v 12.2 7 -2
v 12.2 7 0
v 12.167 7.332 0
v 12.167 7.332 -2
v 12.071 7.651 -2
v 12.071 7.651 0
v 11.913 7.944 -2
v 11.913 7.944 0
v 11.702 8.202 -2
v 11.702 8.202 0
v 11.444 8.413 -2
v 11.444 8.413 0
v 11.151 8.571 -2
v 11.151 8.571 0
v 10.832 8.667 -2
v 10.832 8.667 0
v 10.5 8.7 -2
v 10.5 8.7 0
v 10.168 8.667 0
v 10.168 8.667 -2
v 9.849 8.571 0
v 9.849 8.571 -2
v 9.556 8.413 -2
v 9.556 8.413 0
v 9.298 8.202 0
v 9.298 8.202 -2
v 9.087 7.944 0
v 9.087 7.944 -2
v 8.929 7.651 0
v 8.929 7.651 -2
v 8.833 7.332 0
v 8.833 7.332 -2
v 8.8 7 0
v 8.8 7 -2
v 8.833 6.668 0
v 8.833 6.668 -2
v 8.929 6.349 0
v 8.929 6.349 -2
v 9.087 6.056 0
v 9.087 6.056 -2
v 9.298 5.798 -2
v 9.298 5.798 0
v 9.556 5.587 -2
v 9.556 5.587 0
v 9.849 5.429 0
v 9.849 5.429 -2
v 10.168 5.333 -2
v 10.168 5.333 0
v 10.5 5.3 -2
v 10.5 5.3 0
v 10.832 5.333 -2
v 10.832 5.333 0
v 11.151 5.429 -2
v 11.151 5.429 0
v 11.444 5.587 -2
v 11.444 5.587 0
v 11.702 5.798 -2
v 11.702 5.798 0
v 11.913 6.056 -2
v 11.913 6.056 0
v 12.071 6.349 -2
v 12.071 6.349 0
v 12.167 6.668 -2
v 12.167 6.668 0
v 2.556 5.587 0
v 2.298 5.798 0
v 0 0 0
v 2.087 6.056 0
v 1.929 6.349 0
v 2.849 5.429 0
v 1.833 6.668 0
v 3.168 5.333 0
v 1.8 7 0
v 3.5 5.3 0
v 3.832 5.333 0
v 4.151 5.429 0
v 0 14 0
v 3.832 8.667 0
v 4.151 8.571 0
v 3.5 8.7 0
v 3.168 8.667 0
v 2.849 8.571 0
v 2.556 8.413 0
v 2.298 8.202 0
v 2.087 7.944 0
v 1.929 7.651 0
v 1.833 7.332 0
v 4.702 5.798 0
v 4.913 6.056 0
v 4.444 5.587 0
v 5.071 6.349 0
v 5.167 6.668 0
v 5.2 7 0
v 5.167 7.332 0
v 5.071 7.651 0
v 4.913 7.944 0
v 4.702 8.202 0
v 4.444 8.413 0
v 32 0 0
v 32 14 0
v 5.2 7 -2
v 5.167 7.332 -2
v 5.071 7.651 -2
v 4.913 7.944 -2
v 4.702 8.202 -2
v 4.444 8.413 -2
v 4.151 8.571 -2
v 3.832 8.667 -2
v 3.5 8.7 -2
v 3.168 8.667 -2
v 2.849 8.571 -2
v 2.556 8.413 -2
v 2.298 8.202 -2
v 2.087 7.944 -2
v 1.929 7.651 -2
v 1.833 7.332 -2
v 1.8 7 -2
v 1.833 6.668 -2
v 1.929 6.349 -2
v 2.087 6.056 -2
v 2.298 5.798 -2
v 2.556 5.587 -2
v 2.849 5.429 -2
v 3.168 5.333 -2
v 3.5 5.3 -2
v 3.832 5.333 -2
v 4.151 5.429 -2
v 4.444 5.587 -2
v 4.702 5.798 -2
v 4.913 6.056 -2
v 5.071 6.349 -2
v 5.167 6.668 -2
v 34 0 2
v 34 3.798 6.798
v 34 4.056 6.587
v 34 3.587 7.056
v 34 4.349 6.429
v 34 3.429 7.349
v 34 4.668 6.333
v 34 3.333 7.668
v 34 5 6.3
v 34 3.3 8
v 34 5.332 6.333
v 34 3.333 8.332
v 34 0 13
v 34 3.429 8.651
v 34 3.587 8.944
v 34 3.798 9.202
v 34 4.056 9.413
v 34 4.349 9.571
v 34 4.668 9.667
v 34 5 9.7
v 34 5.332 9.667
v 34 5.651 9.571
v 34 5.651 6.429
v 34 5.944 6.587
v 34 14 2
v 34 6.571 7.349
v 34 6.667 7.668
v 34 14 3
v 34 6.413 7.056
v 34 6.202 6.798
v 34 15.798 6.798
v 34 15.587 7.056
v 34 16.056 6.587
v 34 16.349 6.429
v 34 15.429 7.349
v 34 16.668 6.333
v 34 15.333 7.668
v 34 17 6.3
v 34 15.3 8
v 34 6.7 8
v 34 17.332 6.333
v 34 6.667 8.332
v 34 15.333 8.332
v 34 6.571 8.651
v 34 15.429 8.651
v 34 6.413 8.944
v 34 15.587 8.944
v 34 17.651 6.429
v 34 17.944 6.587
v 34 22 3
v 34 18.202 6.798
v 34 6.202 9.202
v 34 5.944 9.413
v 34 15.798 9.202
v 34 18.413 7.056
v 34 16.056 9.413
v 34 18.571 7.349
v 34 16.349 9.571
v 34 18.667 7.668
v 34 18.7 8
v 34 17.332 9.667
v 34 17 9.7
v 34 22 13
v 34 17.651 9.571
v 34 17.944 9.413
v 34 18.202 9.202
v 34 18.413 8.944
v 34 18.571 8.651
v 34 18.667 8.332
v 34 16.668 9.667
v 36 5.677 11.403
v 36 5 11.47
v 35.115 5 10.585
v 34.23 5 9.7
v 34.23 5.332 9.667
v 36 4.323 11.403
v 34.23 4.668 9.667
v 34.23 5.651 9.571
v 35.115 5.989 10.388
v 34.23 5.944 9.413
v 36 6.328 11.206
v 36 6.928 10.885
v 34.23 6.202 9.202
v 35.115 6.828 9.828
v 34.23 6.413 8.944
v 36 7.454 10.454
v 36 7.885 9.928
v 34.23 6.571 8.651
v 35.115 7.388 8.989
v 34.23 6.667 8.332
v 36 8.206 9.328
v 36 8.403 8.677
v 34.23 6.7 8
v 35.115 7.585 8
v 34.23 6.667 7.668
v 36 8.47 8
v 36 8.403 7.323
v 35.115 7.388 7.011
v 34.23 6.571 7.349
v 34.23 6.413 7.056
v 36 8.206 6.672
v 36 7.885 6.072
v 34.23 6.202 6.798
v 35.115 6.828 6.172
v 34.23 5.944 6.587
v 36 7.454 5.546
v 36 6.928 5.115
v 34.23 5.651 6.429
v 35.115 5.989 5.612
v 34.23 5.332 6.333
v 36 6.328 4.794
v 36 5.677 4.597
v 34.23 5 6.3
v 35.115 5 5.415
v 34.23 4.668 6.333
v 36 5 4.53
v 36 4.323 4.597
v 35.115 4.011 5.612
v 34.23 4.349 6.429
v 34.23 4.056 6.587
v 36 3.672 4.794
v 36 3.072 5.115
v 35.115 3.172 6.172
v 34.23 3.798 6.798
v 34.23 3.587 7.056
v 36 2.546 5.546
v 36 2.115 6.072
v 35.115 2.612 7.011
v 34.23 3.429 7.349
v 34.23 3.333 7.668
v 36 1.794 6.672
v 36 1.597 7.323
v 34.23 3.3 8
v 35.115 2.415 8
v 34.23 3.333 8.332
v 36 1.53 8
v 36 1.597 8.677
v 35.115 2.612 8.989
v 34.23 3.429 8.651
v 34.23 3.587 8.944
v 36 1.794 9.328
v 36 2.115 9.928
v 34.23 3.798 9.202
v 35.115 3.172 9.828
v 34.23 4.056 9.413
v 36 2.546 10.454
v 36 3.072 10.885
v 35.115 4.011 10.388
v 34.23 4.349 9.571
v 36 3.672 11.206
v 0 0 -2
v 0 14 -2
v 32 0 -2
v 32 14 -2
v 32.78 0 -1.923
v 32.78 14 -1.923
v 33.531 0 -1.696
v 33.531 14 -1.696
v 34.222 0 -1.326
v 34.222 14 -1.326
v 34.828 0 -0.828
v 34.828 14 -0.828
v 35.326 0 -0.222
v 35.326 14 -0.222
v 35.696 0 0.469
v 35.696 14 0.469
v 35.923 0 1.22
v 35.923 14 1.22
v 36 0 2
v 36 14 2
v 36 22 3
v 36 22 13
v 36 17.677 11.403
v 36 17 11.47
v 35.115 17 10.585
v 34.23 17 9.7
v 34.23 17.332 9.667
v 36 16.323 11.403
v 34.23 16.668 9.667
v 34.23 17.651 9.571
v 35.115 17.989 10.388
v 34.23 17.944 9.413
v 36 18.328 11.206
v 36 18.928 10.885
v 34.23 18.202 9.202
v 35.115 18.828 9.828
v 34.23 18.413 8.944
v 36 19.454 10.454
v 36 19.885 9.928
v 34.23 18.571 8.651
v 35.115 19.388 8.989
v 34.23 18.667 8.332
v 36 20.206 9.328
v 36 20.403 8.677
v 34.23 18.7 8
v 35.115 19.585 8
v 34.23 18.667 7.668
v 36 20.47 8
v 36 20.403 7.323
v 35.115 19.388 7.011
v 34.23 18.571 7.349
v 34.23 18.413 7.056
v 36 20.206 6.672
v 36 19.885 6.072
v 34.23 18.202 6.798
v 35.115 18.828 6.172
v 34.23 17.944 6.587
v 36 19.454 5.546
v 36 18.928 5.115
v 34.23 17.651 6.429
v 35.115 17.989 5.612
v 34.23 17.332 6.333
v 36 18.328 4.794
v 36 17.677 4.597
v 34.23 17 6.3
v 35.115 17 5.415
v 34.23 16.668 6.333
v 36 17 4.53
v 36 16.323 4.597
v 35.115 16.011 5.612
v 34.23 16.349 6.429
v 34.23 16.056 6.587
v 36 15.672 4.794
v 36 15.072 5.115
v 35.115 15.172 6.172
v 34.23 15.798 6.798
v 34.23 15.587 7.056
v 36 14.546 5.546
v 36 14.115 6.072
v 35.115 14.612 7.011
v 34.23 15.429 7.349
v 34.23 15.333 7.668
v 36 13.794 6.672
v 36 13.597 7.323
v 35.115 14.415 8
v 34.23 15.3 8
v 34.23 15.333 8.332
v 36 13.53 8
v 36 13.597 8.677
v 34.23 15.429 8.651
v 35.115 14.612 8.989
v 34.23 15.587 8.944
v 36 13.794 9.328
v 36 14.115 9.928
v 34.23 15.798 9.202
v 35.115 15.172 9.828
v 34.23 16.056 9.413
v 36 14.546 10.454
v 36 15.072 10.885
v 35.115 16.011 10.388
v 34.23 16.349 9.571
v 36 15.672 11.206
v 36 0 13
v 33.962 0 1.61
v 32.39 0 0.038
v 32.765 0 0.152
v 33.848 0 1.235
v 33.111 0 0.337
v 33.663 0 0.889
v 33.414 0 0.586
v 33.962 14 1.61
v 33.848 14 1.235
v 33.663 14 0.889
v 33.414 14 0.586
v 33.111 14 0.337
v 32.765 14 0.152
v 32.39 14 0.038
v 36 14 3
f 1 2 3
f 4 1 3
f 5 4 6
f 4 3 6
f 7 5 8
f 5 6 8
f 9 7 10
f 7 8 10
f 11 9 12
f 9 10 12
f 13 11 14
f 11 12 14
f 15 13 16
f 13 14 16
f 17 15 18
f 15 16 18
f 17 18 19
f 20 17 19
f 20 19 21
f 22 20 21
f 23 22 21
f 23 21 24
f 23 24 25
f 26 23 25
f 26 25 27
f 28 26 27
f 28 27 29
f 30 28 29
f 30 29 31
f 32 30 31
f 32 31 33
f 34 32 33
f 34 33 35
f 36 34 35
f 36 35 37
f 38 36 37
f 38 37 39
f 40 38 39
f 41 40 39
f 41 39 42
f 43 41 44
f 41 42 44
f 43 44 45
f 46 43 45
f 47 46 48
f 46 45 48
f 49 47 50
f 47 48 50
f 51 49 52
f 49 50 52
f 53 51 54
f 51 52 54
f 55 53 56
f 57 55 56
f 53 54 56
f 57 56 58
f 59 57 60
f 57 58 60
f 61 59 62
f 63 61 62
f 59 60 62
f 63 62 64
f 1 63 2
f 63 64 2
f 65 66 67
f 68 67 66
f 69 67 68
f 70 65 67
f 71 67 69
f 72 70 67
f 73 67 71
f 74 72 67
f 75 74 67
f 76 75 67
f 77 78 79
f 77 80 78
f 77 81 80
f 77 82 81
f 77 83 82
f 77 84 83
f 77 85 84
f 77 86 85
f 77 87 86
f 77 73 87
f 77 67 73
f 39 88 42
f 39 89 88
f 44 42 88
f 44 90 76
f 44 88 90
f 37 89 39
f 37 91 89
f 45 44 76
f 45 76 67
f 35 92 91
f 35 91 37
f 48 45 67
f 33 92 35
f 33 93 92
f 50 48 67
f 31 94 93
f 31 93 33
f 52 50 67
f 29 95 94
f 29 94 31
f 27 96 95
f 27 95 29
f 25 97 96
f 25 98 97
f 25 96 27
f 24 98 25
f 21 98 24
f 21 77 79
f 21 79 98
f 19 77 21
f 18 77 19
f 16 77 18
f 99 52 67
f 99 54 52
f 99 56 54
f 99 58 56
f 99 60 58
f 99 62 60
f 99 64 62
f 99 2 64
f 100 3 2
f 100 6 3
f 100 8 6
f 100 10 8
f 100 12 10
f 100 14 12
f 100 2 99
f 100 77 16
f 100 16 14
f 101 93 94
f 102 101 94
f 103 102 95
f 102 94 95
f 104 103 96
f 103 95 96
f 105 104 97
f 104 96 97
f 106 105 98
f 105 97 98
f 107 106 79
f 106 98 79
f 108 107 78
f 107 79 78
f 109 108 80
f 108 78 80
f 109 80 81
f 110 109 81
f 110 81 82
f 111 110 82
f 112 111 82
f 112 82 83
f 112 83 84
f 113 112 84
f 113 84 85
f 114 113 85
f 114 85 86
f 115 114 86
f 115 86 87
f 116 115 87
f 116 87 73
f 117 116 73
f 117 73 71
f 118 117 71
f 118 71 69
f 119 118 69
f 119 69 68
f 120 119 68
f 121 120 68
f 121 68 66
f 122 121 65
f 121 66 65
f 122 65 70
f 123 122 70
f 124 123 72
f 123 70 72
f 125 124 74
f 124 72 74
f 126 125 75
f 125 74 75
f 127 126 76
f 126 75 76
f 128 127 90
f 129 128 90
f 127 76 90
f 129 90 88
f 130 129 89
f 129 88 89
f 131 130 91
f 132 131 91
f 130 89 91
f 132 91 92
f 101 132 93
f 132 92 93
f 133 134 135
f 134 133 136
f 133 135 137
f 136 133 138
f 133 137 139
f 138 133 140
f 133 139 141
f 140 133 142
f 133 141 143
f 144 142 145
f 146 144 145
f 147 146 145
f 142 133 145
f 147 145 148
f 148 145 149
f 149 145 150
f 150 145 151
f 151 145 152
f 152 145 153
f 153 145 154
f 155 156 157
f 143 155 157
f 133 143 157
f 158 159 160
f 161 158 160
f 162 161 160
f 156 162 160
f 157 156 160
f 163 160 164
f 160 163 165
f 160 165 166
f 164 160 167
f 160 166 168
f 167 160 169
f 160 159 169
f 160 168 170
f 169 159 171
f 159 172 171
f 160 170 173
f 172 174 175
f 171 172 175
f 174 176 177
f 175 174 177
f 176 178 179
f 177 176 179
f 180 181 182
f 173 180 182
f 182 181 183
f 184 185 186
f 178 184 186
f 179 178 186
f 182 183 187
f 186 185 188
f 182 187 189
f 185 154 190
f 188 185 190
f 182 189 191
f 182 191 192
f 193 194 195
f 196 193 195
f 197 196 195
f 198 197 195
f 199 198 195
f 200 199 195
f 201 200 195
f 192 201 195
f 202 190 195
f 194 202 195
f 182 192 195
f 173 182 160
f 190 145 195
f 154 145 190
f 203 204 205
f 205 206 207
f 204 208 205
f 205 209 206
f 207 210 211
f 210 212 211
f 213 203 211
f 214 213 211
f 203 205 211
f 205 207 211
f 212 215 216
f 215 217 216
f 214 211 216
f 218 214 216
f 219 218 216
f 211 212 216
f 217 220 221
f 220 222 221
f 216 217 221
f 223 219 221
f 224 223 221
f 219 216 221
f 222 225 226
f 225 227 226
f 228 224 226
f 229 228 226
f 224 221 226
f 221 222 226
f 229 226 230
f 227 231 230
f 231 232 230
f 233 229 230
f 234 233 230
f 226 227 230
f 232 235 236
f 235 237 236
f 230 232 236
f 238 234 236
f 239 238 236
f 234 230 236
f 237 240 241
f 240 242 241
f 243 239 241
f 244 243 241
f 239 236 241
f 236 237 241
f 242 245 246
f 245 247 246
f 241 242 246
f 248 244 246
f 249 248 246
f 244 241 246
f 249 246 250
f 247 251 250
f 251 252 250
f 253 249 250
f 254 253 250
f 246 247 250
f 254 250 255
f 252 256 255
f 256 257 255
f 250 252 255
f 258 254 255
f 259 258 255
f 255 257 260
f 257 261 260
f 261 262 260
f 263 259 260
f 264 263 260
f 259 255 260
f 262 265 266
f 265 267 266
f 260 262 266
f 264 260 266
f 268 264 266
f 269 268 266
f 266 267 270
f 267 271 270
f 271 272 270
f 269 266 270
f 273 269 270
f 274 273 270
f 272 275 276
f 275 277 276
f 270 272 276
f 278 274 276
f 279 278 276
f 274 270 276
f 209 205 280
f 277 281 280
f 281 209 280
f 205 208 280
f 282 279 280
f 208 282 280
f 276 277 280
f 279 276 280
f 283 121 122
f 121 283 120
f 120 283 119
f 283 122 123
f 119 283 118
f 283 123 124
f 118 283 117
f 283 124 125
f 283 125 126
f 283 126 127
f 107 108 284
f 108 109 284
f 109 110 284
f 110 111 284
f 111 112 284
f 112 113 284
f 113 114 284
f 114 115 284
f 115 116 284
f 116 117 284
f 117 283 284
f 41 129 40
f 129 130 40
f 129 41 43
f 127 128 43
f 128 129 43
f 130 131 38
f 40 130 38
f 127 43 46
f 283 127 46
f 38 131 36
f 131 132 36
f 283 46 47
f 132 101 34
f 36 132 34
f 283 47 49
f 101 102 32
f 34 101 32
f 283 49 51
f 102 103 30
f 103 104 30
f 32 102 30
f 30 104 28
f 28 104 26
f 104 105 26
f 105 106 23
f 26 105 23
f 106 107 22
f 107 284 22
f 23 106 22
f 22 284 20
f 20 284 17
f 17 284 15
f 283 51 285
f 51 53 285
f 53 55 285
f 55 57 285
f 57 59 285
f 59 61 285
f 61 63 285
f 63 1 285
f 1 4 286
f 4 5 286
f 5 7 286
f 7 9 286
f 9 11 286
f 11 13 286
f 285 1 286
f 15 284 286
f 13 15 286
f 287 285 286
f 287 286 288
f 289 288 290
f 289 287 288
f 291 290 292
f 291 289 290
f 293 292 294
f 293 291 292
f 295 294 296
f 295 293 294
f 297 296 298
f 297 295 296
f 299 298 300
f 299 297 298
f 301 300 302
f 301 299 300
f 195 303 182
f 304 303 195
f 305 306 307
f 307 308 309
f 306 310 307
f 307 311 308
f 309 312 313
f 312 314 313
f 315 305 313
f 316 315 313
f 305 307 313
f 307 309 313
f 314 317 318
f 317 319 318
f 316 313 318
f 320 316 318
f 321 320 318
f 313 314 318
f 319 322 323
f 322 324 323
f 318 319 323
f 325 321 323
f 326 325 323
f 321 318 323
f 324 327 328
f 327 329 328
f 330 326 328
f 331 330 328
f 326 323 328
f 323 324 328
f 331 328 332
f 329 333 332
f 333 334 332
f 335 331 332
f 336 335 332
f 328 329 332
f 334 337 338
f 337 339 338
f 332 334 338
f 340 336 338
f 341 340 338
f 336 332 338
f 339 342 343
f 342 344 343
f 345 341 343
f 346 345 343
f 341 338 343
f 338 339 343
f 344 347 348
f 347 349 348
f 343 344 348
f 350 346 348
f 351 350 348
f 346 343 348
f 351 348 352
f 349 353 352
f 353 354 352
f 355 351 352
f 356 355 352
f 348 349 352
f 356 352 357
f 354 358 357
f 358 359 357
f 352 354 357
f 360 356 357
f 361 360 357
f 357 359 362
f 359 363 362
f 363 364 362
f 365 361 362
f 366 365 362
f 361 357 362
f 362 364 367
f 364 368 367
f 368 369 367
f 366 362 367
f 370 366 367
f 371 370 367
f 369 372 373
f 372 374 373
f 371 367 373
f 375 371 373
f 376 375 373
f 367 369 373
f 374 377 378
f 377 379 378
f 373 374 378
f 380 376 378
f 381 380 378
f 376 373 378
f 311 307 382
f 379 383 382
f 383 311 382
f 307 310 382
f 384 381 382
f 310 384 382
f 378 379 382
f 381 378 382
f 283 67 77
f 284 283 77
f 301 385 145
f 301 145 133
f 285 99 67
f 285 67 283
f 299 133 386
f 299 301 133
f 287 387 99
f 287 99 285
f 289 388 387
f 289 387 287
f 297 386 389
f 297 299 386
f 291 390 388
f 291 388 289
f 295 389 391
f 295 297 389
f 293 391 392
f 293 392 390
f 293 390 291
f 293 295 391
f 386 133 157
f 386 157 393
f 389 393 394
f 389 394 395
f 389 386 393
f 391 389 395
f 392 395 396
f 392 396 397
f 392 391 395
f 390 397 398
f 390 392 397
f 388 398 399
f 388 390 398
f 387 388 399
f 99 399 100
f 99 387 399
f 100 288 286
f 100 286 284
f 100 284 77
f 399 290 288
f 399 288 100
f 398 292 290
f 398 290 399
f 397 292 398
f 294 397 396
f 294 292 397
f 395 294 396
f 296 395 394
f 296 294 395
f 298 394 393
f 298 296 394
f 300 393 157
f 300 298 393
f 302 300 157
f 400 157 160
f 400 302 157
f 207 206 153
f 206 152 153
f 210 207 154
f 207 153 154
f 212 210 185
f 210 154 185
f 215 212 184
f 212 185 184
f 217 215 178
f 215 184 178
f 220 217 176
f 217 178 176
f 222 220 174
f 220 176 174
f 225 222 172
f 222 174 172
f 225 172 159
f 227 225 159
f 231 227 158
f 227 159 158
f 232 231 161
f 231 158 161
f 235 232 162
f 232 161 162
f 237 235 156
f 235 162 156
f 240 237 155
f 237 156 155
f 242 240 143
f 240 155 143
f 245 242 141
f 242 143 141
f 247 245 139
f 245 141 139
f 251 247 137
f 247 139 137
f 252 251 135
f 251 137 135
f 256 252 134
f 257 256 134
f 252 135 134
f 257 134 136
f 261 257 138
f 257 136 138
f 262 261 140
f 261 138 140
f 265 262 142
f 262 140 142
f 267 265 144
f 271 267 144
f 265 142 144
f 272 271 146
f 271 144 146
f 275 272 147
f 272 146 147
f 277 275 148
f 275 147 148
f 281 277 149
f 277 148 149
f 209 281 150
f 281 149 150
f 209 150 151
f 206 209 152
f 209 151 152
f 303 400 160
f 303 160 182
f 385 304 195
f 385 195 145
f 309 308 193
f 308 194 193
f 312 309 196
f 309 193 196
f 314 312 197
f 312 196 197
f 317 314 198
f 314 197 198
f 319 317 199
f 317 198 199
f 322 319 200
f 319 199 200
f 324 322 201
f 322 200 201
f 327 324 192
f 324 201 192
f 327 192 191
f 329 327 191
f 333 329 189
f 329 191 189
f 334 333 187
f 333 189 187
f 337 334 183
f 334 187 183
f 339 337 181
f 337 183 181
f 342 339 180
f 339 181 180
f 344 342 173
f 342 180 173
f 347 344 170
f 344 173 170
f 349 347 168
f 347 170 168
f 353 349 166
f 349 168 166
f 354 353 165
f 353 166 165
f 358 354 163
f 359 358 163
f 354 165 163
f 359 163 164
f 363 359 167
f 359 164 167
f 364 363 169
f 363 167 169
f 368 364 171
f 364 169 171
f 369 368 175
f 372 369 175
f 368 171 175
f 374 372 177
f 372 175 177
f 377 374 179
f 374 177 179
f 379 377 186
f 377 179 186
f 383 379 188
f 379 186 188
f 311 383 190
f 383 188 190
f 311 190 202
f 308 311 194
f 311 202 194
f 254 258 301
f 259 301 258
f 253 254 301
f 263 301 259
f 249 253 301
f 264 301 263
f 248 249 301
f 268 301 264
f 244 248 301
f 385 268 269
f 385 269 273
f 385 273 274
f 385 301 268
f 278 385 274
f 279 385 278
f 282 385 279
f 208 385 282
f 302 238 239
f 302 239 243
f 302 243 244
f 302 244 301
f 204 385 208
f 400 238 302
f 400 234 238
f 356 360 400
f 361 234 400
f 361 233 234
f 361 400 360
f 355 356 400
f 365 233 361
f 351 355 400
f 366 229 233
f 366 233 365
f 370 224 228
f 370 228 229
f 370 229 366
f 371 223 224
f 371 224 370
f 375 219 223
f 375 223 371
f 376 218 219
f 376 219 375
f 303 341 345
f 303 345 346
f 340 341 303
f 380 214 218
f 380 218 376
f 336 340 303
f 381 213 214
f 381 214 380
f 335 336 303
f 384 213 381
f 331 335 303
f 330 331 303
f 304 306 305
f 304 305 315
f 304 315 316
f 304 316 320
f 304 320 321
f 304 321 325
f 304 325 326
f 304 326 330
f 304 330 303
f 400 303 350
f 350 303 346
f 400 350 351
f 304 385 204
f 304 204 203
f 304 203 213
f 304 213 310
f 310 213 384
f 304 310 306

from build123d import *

# Parameters (mm, degrees)
SKIZZE1_W                                            = 34
SKIZZE1_H                                            = 14
BASIS_BLECH1_DEPTH                                   = 2
KANTE_LASCHE1_STRIP_W                                = 12
KANTE_LASCHE1_STRIP_H                                = 2
KANTE_LASCHE1_STRIP_CUT_DEPTH                        = 14
KANTE_LASCHE1_DEPTH                                  = 14
KANTE_LASCHE1_START                                  = 2
KANTE_LASCHE1_FLAT_DEPTH                             = 2
SKIZZE10_R                                           = 1.7
SCHNITT_LINEAR_AUSTRAGEN1_DEPTH                      = 45.147480109
FORMSENKUNG_F_R_M3_SENKSCHRAUBE_MIT_INNE_D           = 3.4
FORMSENKUNG_F_R_M3_SENKSCHRAUBE_MIT_INNE_CSINK_D     = 6.94
FORMSENKUNG_F_R_M3_SENKSCHRAUBE_MIT_INNE_CSINK_ANGLE = 90


# Sheet-metal steps are written as plain solids
with BuildPart() as part:
    # Skizze1 → Basis-Blech1 (new body)
    with BuildSketch(Plane.XY):
        with Locations((17, 7)):
            Rectangle(SKIZZE1_W, SKIZZE1_H)
    extrude(amount=-BASIS_BLECH1_DEPTH)

    # Kante-Lasche1 strip (across the edge) → Kante-Lasche1 strip cut (cut)
    with BuildSketch(Plane(origin=(34, 0, 0), x_dir=(-1, 0, 0), z_dir=(0, 1, 0))):
        with Locations((-4, -1)):
            Rectangle(KANTE_LASCHE1_STRIP_W, KANTE_LASCHE1_STRIP_H)
    extrude(amount=KANTE_LASCHE1_STRIP_CUT_DEPTH, mode=Mode.SUBTRACT)

    # Kante-Lasche1 bend section (across the edge) → Kante-Lasche1 (add)
    with BuildSketch(Plane(origin=(34, 0, 0), x_dir=(-1, 0, 0), z_dir=(0, 1, 0))):
        with BuildLine():
            Line((-2, 2), (0, 2))
            ThreePointArc((0, 2), (0.585786438, 0.585786438), (2, 0))
            Line((2, 0), (2, -2))
            ThreePointArc((2, -2), (-0.828427125, -0.828427125), (-2, 2))
        make_face()
    extrude(amount=KANTE_LASCHE1_DEPTH)

    # Kante-Lasche1 profile (on flange) → Kante-Lasche1 flat (add)
    with BuildSketch(Plane.YZ.offset(34).offset(KANTE_LASCHE1_START)):
        Polygon((0, 13), (0, 2), (14, 2), (14, 3), (22, 3), (22, 13), align=None)
    extrude(amount=-KANTE_LASCHE1_FLAT_DEPTH)

    # Skizze10 → Schnitt-Linear austragen1 (cut, through all)
    with BuildSketch(Plane.XY):
        with Locations((3.5, 7)):
            Circle(SKIZZE10_R)
        with Locations((10.5, 7)):
            Circle(SKIZZE10_R)
    extrude(amount=-SCHNITT_LINEAR_AUSTRAGEN1_DEPTH, mode=Mode.SUBTRACT)

    # Formsenkung für M3 Senkschraube mit Innensechskant1 (through all)
    with Locations(Plane(origin=(36, 0, 0), x_dir=(0, 0, -1), z_dir=(1, 0, 0))):
        with Locations((-8, 5), (-8, 17)):
            CounterSinkHole(FORMSENKUNG_F_R_M3_SENKSCHRAUBE_MIT_INNE_D / 2, FORMSENKUNG_F_R_M3_SENKSCHRAUBE_MIT_INNE_CSINK_D / 2, counter_sink_angle=FORMSENKUNG_F_R_M3_SENKSCHRAUBE_MIT_INNE_CSINK_ANGLE)


solid = part.part
